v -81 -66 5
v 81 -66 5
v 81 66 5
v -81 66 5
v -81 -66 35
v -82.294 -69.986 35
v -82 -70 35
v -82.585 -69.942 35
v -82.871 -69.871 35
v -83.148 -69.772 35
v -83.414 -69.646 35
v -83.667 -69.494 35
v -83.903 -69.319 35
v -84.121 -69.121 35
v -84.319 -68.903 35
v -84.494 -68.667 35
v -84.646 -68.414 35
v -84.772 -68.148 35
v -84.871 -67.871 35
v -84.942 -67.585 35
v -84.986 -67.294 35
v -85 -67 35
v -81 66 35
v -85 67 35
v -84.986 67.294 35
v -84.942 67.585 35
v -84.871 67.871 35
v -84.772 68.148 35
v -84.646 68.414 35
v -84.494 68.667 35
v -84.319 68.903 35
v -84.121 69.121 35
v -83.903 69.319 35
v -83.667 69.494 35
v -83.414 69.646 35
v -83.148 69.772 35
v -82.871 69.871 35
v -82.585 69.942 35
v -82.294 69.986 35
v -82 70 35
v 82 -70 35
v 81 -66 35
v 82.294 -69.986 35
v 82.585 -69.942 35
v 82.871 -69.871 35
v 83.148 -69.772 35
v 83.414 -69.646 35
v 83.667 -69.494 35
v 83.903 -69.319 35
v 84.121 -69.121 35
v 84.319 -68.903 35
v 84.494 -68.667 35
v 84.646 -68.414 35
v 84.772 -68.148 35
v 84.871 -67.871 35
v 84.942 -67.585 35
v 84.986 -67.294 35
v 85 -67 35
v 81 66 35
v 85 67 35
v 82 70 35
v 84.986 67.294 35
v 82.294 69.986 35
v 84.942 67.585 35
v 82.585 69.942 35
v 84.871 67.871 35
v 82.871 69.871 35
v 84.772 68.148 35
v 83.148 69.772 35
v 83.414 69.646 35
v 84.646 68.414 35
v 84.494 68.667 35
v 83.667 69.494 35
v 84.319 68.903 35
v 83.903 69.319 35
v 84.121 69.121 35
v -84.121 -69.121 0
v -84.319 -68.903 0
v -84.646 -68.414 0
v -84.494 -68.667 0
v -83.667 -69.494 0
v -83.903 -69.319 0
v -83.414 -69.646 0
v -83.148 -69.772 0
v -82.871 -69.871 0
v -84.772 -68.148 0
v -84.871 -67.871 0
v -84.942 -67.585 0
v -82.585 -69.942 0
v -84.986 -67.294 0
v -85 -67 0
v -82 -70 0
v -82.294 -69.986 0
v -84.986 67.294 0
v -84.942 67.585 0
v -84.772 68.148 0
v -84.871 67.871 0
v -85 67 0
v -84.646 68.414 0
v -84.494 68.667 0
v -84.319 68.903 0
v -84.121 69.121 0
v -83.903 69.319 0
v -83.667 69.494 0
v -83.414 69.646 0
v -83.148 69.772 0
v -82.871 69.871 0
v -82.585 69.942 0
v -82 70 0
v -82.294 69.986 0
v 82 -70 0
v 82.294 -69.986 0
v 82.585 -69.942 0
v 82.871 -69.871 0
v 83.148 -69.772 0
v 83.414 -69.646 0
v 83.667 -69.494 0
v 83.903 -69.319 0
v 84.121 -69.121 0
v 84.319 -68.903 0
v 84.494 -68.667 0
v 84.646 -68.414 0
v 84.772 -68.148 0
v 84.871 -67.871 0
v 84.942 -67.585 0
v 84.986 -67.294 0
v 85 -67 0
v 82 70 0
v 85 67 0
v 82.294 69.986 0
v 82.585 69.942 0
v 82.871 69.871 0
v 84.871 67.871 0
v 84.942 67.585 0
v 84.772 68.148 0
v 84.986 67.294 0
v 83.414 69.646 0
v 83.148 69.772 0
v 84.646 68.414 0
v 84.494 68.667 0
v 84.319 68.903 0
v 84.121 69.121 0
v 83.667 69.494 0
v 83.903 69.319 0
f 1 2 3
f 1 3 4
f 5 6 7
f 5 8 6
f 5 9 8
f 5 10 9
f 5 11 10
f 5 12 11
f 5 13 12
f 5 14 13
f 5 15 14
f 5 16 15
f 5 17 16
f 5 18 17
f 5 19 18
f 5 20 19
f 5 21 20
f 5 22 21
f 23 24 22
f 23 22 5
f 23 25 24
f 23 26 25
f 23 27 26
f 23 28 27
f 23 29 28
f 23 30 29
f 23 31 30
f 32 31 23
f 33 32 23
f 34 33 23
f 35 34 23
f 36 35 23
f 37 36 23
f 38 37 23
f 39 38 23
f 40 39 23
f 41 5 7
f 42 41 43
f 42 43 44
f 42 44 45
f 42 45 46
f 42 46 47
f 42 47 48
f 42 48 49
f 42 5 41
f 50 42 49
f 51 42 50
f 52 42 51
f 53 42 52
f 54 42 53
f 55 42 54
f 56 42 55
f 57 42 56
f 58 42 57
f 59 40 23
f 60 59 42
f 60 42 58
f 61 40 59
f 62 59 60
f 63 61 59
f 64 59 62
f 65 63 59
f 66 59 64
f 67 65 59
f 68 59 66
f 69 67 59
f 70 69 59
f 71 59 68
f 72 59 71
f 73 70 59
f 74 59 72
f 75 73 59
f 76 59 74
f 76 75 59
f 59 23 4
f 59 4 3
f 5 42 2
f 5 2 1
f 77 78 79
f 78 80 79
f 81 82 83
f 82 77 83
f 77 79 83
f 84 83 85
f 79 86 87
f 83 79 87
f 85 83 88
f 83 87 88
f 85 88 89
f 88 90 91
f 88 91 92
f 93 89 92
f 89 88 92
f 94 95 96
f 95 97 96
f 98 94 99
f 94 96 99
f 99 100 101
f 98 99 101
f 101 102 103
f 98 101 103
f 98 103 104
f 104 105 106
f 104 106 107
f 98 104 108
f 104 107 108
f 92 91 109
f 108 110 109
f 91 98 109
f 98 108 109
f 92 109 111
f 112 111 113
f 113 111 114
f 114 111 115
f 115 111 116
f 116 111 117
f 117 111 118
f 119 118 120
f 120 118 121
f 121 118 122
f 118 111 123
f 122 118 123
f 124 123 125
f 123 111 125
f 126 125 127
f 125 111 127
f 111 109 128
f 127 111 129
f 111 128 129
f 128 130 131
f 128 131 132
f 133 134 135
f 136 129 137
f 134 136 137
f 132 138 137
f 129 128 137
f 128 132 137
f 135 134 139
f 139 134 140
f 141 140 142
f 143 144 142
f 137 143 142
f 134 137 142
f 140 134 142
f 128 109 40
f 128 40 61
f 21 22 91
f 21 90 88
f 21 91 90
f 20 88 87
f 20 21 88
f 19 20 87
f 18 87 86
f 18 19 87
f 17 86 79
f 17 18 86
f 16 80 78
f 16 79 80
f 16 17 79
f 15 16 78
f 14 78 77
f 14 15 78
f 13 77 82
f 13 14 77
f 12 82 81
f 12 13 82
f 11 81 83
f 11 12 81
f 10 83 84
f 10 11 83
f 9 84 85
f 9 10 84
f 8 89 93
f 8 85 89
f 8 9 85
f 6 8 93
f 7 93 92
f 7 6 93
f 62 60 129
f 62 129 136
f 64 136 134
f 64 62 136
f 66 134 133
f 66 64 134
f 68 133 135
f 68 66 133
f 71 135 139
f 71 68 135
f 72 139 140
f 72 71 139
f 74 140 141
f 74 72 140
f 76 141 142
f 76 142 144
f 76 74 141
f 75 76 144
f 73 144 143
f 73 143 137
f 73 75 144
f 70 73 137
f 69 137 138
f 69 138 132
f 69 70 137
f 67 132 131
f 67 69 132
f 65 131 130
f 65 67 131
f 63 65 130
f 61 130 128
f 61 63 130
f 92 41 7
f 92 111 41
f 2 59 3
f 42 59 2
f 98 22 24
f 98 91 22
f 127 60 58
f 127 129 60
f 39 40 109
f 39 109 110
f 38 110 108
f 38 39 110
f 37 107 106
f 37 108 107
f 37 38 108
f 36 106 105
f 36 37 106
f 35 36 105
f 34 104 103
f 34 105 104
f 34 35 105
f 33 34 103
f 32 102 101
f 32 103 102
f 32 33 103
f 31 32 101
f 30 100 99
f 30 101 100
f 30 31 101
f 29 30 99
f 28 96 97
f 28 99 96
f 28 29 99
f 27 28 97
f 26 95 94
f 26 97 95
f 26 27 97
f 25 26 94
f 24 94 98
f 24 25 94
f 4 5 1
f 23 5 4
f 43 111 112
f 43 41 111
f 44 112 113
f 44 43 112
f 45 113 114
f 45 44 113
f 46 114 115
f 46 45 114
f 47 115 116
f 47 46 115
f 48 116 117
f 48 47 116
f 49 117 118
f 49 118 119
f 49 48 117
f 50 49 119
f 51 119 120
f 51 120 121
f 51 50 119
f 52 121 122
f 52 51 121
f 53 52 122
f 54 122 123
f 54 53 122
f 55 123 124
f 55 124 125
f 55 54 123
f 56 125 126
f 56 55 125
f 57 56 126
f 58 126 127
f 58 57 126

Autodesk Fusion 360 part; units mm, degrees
sketch "Esboço1" plane through (0, 0, 0) normal (0, 0, 1) x (1, 0, 0)
  line L0 (85, -70) -> (-85, -70)
  line L1 (-85, -70) -> (-85, 70)
  line L2 (-85, 70) -> (85, 70)
  line L3 (85, 70) -> (85, -70)
  line L4 (85, -70) -> (-85, 70) construction
  line L5 (-85, -70) -> (85, 70) construction
  dimension "d1" = 170
  dimension "d2" = 140
extrude "Extrusão1" add sketch "Esboço1" along normal blind 35
sketch "Esboço2" plane through (0, 0, 35) normal (0, 0, 1) x (-1, 0, 0)
  line L0 (-85, -70) -> (85, -70)
  line L1 (85, -70) -> (85, 70)
  line L2 (85, 70) -> (-85, 70)
  line L3 (-85, 70) -> (-85, -70)
  line L4 (-81, 66) -> (81, 66)
  line L5 (81, 66) -> (81, -66)
  line L6 (81, -66) -> (-81, -66)
  line L7 (-81, -66) -> (-81, 66)
  line L8 (-81, 66) -> (81, -66) construction
  line L9 (81, 66) -> (-81, -66) construction
  dimension "d5" = 162
  dimension "d6" = 132
extrude "Extrusão2" cut sketch "Esboço2" against normal blind 30 contours L4 L5 L6 L7
fillet "Arredondamento1" radius 3 4 edges at (-85, 70, 17.5) (-85, -70, 17.5) (85, -70, 17.5) (85, 70, 17.5)
